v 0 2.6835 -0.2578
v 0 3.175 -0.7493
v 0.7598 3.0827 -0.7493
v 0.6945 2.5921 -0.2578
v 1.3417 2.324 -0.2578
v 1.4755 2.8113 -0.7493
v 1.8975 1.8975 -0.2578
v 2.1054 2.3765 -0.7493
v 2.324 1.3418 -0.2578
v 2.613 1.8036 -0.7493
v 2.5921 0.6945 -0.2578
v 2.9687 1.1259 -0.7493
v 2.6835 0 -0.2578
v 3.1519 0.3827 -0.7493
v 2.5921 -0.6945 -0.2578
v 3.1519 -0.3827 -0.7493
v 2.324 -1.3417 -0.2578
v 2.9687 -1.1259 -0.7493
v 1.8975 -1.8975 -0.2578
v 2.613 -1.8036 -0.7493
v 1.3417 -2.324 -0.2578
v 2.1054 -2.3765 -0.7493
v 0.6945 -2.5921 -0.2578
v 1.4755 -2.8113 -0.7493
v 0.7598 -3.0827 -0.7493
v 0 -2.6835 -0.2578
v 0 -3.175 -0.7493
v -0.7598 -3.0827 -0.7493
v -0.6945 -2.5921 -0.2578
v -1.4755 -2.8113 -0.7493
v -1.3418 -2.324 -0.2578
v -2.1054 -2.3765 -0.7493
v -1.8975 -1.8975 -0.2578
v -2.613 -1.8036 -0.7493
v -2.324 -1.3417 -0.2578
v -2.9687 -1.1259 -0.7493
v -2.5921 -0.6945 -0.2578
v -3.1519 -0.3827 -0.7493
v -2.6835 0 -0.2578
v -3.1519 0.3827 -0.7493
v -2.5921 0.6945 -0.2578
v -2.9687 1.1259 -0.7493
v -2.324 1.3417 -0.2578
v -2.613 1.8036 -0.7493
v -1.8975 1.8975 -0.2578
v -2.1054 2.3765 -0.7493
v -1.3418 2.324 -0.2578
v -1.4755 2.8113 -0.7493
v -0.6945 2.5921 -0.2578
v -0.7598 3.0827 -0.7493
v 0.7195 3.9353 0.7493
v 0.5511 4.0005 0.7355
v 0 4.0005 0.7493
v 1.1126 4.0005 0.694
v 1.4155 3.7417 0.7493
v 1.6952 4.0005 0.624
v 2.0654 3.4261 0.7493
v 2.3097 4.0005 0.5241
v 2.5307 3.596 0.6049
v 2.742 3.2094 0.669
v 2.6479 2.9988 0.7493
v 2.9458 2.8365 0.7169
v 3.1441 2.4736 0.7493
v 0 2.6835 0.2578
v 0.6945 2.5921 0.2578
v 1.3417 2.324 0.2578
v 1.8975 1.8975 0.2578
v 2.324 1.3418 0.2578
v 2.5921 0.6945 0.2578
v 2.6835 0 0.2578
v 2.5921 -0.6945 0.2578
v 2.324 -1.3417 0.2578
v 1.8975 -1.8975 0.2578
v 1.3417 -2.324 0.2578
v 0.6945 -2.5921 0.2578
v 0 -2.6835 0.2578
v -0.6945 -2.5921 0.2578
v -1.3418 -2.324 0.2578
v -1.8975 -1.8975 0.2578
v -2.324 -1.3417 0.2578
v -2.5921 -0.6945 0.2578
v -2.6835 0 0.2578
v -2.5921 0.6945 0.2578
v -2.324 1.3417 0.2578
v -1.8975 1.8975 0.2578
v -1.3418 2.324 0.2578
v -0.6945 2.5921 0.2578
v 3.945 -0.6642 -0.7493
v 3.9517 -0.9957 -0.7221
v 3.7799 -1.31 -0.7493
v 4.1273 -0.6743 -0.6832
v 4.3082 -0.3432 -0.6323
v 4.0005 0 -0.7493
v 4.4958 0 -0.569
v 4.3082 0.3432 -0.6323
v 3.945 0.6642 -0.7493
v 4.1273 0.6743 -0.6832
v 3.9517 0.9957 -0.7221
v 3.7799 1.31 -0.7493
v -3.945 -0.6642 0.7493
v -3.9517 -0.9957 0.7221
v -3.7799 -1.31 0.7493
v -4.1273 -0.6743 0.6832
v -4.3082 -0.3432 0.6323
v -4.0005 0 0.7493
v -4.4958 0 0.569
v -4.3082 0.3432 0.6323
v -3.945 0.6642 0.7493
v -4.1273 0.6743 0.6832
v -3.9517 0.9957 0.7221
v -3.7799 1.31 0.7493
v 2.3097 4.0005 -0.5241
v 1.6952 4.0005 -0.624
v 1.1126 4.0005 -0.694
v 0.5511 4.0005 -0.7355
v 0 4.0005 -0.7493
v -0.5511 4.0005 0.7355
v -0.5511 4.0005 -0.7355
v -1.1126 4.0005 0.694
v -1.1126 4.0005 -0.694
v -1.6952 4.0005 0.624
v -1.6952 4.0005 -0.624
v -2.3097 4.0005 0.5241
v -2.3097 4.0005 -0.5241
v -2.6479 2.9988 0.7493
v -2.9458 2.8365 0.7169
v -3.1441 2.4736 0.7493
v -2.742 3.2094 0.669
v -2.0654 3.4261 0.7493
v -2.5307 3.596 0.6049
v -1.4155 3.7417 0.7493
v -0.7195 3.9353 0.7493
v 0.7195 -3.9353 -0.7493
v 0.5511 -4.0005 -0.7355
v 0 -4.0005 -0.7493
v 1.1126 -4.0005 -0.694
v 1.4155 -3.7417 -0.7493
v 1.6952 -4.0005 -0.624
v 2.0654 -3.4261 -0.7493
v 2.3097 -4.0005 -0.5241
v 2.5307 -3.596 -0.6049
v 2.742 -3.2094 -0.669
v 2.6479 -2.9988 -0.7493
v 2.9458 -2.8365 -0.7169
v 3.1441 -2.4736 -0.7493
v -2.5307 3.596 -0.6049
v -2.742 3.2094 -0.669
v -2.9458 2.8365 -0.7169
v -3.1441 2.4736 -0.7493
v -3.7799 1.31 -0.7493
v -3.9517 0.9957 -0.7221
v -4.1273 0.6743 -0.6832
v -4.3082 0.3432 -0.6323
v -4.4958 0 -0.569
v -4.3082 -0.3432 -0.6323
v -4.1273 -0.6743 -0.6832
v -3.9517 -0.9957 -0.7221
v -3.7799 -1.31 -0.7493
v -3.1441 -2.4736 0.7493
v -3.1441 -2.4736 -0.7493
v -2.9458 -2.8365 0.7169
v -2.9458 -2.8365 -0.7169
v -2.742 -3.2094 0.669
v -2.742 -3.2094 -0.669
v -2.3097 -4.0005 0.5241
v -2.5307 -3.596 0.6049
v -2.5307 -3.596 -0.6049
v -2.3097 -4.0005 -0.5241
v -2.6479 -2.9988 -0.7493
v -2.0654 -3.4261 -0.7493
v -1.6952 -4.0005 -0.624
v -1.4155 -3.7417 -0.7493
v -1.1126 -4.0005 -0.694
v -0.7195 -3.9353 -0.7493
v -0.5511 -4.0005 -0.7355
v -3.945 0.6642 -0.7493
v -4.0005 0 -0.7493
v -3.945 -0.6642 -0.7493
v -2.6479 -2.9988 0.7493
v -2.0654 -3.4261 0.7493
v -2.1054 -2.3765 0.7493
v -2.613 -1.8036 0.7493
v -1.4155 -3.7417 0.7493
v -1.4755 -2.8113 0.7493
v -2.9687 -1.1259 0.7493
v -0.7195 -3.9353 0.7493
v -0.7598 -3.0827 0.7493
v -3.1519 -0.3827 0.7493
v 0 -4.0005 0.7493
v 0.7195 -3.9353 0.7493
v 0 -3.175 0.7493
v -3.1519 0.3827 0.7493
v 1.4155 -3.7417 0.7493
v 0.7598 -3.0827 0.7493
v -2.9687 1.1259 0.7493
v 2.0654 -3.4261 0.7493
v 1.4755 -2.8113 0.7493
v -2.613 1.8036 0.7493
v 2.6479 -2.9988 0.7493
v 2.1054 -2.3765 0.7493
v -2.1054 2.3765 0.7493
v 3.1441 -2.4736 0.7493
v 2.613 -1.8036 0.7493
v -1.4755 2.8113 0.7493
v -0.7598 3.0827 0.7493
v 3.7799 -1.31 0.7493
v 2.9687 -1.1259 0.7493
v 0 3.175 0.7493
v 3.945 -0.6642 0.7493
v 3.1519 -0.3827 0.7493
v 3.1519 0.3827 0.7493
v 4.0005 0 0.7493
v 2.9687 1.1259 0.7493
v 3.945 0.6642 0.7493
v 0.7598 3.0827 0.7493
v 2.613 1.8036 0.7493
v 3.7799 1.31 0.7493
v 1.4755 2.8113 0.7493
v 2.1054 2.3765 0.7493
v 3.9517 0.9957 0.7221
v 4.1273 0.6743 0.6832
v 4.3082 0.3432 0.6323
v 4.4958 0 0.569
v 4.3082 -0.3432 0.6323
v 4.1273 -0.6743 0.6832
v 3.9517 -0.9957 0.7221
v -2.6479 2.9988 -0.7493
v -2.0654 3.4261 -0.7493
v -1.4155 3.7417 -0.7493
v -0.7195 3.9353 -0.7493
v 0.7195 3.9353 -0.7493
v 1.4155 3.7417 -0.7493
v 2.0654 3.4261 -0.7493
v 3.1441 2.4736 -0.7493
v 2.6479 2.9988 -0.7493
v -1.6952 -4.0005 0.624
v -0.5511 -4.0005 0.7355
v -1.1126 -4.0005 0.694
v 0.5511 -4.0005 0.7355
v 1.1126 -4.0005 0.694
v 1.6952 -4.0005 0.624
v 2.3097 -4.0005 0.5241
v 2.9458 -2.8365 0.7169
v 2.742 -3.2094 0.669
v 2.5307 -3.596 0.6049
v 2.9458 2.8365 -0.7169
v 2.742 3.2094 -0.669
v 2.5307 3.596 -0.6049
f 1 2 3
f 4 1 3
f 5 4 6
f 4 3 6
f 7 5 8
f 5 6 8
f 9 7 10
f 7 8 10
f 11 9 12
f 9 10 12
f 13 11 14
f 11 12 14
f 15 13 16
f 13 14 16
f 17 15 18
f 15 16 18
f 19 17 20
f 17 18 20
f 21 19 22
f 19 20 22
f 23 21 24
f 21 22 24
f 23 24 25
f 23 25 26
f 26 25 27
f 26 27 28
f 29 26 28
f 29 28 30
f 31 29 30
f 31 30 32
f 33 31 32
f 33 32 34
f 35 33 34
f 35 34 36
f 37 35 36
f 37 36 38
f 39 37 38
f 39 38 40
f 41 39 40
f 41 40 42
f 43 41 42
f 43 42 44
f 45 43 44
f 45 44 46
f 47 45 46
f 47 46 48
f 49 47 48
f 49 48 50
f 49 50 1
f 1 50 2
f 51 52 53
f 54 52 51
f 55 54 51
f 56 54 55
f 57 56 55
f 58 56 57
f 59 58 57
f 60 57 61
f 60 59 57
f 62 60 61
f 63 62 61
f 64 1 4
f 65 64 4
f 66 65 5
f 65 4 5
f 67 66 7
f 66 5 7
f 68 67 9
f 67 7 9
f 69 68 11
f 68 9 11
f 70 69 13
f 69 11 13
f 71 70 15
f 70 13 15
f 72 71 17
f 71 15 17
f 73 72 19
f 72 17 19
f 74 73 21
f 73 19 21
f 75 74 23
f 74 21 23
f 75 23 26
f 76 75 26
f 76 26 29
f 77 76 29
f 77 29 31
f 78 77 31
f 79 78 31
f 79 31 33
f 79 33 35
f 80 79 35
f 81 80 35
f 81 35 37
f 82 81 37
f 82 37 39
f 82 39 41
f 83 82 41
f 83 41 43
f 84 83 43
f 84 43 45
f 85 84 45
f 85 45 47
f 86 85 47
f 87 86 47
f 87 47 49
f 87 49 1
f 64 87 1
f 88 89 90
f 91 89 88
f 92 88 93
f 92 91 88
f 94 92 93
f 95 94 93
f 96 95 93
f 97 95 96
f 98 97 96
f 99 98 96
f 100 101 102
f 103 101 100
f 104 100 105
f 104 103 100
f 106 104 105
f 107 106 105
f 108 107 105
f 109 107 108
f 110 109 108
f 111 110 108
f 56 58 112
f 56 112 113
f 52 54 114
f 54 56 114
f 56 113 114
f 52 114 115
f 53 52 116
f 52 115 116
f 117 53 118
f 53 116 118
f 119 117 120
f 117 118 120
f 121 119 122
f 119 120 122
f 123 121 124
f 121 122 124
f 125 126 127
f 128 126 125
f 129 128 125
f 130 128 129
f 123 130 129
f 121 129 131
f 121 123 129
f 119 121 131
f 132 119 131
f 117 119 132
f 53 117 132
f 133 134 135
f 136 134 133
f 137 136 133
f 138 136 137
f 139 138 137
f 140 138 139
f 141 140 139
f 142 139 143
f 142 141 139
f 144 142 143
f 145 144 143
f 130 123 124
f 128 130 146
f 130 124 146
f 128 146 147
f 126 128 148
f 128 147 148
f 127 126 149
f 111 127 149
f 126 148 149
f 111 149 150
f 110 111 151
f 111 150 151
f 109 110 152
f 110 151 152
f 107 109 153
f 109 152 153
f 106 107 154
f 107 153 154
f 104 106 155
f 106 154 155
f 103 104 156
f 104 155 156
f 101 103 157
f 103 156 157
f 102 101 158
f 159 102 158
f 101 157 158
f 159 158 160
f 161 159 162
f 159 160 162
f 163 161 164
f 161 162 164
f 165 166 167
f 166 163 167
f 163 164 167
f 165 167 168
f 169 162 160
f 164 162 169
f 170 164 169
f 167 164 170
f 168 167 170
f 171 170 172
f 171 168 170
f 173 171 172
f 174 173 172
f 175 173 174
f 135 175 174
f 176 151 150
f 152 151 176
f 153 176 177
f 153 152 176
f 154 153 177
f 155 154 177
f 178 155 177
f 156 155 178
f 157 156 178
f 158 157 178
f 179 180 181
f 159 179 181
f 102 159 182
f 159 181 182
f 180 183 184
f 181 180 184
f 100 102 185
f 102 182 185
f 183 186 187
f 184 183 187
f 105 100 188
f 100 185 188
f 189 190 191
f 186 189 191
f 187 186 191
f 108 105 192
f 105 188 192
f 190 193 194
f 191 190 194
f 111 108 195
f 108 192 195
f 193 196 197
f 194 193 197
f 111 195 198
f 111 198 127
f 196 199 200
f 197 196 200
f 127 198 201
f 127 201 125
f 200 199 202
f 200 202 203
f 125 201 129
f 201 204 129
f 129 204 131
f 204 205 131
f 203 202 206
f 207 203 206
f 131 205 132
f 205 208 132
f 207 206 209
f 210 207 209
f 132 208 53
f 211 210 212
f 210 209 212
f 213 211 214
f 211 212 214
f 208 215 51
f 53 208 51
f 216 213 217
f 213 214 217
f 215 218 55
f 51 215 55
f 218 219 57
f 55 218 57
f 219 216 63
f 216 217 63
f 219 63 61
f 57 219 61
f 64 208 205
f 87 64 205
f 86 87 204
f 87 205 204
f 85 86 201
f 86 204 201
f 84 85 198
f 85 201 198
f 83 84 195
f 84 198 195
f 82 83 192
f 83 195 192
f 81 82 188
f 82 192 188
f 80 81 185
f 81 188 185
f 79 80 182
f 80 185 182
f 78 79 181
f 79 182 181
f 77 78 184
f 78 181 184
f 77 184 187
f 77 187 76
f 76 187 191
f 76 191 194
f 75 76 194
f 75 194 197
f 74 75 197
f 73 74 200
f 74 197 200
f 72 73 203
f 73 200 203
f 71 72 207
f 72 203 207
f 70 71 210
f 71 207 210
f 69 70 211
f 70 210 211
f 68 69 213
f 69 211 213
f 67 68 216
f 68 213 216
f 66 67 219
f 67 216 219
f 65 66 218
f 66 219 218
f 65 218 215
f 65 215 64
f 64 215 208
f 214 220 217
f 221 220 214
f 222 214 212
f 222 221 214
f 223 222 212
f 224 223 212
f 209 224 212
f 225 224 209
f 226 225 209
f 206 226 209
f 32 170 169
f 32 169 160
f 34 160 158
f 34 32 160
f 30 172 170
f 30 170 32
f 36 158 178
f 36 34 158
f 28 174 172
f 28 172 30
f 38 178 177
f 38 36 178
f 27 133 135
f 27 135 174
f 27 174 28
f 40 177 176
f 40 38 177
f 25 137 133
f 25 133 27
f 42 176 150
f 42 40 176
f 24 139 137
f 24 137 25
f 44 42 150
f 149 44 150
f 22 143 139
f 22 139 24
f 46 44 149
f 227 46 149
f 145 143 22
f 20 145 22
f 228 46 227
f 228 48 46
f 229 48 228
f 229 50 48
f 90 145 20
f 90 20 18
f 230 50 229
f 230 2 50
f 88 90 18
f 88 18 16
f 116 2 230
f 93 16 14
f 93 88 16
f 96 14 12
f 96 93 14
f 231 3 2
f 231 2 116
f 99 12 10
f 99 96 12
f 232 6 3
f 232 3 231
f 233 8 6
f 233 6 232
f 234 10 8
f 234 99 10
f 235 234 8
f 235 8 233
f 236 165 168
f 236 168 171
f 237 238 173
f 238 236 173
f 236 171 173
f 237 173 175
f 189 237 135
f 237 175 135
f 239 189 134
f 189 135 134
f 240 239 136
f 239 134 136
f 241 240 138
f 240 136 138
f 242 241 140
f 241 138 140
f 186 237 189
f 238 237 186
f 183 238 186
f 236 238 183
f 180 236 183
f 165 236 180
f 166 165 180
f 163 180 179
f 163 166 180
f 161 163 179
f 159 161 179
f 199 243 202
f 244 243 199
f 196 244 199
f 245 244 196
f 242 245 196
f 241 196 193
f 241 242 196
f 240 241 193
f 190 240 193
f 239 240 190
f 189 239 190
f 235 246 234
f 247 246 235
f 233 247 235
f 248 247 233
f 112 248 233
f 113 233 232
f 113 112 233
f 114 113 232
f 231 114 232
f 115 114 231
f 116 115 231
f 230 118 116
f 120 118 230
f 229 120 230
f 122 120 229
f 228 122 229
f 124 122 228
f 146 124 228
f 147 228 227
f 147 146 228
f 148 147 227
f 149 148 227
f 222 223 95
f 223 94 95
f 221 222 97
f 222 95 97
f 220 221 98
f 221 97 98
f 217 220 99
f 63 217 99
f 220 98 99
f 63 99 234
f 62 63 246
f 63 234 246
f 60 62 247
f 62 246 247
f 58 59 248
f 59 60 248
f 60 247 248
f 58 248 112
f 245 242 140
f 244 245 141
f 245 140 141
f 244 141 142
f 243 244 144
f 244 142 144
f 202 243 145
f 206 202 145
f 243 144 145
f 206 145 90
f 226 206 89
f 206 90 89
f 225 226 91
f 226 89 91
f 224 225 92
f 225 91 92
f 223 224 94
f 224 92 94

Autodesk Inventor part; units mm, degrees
sketch "Sketch_1" plane through (0, 0, 0) normal (1, 0, 0) x (0, 1, 0)
  line L0 (0, -0.7493) -> (0, 0.7493)
  line L1 (0, 0.7493) -> (4.0005, 0.7493)
  line L2 (4.0005, 0.7493) -> (4.8006, 0.4581)
  line L3 (4.8006, 0.4581) -> (4.8006, -0.4581)
  line L4 (4.8006, -0.4581) -> (4.0005, -0.7493)
  line L5 (4.0005, -0.7493) -> (0, -0.7493)
  line L6 (0, -0.7493) -> (0, 0.7493)
revolve "Revolution1" add sketch "Sketch_1" angle 360 about axis through (0, 0, -0.7493) along (0, 0, -1)
sketch "Sketch_2" plane through (0, 0, 0) normal (0, 0, 1) x (1, 0, 0)
  line L0 (-8.001, -8.001) -> (8.001, -8.001)
  line L1 (8.001, -8.001) -> (8.001, 8.001)
  line L2 (8.001, 8.001) -> (-8.001, 8.001)
  line L3 (-8.001, 8.001) -> (-8.001, -8.001)
  line L4 (-4.4958, 0) -> (-2.3097, -4.0005)
  line L5 (-2.3097, -4.0005) -> (2.3097, -4.0005)
  line L6 (2.3097, -4.0005) -> (4.4958, 0)
  line L7 (4.4958, 0) -> (2.3097, 4.0005)
  line L8 (2.3097, 4.0005) -> (-2.3097, 4.0005)
  line L9 (-2.3097, 4.0005) -> (-4.4958, 0)
extrude "Extrusion1" cut sketch "Sketch_2" along normal mid plane 2.9972
sketch "Sketch_6" plane through (0, 0, 0) normal (1, 0, 0) x (0, 1, 0)
  line L0 (0, -0.7493) -> (0, 0.7493)
  line L1 (0, 0.7493) -> (3.175, 0.7493)
  line L2 (3.175, 0.7493) -> (2.6835, 0.2578)
  line L3 (2.6835, 0.2578) -> (2.6835, -0.2578)
  line L4 (2.6835, -0.2578) -> (3.175, -0.7493)
  line L5 (3.175, -0.7493) -> (0, -0.7493)
  line L6 (0, -0.7493) -> (0, 0.7493)
revolve "Revolution2" cut sketch "Sketch_6" angle 360 about axis through (0, 0, -0.7493) along (0, 0, -1)
thread "Thread1" size "1/4-28 UNF" class "2B" standard "ANSI Unified Screw Threads" full length
ref_plane "nut_XY" through (0, 0, 0.7493) normal (0, 0, 1) x (1, 0, 0)
ref_plane "nut_YZ" through (0, 0, 0.7493) normal (1, 0, 0) x (0, 1, 0)
ref_plane "nut_ZX" through (0, 0, 0.7493) normal (0, 1, 0) x (0, 0, 1)
properties part number "AT513H"
